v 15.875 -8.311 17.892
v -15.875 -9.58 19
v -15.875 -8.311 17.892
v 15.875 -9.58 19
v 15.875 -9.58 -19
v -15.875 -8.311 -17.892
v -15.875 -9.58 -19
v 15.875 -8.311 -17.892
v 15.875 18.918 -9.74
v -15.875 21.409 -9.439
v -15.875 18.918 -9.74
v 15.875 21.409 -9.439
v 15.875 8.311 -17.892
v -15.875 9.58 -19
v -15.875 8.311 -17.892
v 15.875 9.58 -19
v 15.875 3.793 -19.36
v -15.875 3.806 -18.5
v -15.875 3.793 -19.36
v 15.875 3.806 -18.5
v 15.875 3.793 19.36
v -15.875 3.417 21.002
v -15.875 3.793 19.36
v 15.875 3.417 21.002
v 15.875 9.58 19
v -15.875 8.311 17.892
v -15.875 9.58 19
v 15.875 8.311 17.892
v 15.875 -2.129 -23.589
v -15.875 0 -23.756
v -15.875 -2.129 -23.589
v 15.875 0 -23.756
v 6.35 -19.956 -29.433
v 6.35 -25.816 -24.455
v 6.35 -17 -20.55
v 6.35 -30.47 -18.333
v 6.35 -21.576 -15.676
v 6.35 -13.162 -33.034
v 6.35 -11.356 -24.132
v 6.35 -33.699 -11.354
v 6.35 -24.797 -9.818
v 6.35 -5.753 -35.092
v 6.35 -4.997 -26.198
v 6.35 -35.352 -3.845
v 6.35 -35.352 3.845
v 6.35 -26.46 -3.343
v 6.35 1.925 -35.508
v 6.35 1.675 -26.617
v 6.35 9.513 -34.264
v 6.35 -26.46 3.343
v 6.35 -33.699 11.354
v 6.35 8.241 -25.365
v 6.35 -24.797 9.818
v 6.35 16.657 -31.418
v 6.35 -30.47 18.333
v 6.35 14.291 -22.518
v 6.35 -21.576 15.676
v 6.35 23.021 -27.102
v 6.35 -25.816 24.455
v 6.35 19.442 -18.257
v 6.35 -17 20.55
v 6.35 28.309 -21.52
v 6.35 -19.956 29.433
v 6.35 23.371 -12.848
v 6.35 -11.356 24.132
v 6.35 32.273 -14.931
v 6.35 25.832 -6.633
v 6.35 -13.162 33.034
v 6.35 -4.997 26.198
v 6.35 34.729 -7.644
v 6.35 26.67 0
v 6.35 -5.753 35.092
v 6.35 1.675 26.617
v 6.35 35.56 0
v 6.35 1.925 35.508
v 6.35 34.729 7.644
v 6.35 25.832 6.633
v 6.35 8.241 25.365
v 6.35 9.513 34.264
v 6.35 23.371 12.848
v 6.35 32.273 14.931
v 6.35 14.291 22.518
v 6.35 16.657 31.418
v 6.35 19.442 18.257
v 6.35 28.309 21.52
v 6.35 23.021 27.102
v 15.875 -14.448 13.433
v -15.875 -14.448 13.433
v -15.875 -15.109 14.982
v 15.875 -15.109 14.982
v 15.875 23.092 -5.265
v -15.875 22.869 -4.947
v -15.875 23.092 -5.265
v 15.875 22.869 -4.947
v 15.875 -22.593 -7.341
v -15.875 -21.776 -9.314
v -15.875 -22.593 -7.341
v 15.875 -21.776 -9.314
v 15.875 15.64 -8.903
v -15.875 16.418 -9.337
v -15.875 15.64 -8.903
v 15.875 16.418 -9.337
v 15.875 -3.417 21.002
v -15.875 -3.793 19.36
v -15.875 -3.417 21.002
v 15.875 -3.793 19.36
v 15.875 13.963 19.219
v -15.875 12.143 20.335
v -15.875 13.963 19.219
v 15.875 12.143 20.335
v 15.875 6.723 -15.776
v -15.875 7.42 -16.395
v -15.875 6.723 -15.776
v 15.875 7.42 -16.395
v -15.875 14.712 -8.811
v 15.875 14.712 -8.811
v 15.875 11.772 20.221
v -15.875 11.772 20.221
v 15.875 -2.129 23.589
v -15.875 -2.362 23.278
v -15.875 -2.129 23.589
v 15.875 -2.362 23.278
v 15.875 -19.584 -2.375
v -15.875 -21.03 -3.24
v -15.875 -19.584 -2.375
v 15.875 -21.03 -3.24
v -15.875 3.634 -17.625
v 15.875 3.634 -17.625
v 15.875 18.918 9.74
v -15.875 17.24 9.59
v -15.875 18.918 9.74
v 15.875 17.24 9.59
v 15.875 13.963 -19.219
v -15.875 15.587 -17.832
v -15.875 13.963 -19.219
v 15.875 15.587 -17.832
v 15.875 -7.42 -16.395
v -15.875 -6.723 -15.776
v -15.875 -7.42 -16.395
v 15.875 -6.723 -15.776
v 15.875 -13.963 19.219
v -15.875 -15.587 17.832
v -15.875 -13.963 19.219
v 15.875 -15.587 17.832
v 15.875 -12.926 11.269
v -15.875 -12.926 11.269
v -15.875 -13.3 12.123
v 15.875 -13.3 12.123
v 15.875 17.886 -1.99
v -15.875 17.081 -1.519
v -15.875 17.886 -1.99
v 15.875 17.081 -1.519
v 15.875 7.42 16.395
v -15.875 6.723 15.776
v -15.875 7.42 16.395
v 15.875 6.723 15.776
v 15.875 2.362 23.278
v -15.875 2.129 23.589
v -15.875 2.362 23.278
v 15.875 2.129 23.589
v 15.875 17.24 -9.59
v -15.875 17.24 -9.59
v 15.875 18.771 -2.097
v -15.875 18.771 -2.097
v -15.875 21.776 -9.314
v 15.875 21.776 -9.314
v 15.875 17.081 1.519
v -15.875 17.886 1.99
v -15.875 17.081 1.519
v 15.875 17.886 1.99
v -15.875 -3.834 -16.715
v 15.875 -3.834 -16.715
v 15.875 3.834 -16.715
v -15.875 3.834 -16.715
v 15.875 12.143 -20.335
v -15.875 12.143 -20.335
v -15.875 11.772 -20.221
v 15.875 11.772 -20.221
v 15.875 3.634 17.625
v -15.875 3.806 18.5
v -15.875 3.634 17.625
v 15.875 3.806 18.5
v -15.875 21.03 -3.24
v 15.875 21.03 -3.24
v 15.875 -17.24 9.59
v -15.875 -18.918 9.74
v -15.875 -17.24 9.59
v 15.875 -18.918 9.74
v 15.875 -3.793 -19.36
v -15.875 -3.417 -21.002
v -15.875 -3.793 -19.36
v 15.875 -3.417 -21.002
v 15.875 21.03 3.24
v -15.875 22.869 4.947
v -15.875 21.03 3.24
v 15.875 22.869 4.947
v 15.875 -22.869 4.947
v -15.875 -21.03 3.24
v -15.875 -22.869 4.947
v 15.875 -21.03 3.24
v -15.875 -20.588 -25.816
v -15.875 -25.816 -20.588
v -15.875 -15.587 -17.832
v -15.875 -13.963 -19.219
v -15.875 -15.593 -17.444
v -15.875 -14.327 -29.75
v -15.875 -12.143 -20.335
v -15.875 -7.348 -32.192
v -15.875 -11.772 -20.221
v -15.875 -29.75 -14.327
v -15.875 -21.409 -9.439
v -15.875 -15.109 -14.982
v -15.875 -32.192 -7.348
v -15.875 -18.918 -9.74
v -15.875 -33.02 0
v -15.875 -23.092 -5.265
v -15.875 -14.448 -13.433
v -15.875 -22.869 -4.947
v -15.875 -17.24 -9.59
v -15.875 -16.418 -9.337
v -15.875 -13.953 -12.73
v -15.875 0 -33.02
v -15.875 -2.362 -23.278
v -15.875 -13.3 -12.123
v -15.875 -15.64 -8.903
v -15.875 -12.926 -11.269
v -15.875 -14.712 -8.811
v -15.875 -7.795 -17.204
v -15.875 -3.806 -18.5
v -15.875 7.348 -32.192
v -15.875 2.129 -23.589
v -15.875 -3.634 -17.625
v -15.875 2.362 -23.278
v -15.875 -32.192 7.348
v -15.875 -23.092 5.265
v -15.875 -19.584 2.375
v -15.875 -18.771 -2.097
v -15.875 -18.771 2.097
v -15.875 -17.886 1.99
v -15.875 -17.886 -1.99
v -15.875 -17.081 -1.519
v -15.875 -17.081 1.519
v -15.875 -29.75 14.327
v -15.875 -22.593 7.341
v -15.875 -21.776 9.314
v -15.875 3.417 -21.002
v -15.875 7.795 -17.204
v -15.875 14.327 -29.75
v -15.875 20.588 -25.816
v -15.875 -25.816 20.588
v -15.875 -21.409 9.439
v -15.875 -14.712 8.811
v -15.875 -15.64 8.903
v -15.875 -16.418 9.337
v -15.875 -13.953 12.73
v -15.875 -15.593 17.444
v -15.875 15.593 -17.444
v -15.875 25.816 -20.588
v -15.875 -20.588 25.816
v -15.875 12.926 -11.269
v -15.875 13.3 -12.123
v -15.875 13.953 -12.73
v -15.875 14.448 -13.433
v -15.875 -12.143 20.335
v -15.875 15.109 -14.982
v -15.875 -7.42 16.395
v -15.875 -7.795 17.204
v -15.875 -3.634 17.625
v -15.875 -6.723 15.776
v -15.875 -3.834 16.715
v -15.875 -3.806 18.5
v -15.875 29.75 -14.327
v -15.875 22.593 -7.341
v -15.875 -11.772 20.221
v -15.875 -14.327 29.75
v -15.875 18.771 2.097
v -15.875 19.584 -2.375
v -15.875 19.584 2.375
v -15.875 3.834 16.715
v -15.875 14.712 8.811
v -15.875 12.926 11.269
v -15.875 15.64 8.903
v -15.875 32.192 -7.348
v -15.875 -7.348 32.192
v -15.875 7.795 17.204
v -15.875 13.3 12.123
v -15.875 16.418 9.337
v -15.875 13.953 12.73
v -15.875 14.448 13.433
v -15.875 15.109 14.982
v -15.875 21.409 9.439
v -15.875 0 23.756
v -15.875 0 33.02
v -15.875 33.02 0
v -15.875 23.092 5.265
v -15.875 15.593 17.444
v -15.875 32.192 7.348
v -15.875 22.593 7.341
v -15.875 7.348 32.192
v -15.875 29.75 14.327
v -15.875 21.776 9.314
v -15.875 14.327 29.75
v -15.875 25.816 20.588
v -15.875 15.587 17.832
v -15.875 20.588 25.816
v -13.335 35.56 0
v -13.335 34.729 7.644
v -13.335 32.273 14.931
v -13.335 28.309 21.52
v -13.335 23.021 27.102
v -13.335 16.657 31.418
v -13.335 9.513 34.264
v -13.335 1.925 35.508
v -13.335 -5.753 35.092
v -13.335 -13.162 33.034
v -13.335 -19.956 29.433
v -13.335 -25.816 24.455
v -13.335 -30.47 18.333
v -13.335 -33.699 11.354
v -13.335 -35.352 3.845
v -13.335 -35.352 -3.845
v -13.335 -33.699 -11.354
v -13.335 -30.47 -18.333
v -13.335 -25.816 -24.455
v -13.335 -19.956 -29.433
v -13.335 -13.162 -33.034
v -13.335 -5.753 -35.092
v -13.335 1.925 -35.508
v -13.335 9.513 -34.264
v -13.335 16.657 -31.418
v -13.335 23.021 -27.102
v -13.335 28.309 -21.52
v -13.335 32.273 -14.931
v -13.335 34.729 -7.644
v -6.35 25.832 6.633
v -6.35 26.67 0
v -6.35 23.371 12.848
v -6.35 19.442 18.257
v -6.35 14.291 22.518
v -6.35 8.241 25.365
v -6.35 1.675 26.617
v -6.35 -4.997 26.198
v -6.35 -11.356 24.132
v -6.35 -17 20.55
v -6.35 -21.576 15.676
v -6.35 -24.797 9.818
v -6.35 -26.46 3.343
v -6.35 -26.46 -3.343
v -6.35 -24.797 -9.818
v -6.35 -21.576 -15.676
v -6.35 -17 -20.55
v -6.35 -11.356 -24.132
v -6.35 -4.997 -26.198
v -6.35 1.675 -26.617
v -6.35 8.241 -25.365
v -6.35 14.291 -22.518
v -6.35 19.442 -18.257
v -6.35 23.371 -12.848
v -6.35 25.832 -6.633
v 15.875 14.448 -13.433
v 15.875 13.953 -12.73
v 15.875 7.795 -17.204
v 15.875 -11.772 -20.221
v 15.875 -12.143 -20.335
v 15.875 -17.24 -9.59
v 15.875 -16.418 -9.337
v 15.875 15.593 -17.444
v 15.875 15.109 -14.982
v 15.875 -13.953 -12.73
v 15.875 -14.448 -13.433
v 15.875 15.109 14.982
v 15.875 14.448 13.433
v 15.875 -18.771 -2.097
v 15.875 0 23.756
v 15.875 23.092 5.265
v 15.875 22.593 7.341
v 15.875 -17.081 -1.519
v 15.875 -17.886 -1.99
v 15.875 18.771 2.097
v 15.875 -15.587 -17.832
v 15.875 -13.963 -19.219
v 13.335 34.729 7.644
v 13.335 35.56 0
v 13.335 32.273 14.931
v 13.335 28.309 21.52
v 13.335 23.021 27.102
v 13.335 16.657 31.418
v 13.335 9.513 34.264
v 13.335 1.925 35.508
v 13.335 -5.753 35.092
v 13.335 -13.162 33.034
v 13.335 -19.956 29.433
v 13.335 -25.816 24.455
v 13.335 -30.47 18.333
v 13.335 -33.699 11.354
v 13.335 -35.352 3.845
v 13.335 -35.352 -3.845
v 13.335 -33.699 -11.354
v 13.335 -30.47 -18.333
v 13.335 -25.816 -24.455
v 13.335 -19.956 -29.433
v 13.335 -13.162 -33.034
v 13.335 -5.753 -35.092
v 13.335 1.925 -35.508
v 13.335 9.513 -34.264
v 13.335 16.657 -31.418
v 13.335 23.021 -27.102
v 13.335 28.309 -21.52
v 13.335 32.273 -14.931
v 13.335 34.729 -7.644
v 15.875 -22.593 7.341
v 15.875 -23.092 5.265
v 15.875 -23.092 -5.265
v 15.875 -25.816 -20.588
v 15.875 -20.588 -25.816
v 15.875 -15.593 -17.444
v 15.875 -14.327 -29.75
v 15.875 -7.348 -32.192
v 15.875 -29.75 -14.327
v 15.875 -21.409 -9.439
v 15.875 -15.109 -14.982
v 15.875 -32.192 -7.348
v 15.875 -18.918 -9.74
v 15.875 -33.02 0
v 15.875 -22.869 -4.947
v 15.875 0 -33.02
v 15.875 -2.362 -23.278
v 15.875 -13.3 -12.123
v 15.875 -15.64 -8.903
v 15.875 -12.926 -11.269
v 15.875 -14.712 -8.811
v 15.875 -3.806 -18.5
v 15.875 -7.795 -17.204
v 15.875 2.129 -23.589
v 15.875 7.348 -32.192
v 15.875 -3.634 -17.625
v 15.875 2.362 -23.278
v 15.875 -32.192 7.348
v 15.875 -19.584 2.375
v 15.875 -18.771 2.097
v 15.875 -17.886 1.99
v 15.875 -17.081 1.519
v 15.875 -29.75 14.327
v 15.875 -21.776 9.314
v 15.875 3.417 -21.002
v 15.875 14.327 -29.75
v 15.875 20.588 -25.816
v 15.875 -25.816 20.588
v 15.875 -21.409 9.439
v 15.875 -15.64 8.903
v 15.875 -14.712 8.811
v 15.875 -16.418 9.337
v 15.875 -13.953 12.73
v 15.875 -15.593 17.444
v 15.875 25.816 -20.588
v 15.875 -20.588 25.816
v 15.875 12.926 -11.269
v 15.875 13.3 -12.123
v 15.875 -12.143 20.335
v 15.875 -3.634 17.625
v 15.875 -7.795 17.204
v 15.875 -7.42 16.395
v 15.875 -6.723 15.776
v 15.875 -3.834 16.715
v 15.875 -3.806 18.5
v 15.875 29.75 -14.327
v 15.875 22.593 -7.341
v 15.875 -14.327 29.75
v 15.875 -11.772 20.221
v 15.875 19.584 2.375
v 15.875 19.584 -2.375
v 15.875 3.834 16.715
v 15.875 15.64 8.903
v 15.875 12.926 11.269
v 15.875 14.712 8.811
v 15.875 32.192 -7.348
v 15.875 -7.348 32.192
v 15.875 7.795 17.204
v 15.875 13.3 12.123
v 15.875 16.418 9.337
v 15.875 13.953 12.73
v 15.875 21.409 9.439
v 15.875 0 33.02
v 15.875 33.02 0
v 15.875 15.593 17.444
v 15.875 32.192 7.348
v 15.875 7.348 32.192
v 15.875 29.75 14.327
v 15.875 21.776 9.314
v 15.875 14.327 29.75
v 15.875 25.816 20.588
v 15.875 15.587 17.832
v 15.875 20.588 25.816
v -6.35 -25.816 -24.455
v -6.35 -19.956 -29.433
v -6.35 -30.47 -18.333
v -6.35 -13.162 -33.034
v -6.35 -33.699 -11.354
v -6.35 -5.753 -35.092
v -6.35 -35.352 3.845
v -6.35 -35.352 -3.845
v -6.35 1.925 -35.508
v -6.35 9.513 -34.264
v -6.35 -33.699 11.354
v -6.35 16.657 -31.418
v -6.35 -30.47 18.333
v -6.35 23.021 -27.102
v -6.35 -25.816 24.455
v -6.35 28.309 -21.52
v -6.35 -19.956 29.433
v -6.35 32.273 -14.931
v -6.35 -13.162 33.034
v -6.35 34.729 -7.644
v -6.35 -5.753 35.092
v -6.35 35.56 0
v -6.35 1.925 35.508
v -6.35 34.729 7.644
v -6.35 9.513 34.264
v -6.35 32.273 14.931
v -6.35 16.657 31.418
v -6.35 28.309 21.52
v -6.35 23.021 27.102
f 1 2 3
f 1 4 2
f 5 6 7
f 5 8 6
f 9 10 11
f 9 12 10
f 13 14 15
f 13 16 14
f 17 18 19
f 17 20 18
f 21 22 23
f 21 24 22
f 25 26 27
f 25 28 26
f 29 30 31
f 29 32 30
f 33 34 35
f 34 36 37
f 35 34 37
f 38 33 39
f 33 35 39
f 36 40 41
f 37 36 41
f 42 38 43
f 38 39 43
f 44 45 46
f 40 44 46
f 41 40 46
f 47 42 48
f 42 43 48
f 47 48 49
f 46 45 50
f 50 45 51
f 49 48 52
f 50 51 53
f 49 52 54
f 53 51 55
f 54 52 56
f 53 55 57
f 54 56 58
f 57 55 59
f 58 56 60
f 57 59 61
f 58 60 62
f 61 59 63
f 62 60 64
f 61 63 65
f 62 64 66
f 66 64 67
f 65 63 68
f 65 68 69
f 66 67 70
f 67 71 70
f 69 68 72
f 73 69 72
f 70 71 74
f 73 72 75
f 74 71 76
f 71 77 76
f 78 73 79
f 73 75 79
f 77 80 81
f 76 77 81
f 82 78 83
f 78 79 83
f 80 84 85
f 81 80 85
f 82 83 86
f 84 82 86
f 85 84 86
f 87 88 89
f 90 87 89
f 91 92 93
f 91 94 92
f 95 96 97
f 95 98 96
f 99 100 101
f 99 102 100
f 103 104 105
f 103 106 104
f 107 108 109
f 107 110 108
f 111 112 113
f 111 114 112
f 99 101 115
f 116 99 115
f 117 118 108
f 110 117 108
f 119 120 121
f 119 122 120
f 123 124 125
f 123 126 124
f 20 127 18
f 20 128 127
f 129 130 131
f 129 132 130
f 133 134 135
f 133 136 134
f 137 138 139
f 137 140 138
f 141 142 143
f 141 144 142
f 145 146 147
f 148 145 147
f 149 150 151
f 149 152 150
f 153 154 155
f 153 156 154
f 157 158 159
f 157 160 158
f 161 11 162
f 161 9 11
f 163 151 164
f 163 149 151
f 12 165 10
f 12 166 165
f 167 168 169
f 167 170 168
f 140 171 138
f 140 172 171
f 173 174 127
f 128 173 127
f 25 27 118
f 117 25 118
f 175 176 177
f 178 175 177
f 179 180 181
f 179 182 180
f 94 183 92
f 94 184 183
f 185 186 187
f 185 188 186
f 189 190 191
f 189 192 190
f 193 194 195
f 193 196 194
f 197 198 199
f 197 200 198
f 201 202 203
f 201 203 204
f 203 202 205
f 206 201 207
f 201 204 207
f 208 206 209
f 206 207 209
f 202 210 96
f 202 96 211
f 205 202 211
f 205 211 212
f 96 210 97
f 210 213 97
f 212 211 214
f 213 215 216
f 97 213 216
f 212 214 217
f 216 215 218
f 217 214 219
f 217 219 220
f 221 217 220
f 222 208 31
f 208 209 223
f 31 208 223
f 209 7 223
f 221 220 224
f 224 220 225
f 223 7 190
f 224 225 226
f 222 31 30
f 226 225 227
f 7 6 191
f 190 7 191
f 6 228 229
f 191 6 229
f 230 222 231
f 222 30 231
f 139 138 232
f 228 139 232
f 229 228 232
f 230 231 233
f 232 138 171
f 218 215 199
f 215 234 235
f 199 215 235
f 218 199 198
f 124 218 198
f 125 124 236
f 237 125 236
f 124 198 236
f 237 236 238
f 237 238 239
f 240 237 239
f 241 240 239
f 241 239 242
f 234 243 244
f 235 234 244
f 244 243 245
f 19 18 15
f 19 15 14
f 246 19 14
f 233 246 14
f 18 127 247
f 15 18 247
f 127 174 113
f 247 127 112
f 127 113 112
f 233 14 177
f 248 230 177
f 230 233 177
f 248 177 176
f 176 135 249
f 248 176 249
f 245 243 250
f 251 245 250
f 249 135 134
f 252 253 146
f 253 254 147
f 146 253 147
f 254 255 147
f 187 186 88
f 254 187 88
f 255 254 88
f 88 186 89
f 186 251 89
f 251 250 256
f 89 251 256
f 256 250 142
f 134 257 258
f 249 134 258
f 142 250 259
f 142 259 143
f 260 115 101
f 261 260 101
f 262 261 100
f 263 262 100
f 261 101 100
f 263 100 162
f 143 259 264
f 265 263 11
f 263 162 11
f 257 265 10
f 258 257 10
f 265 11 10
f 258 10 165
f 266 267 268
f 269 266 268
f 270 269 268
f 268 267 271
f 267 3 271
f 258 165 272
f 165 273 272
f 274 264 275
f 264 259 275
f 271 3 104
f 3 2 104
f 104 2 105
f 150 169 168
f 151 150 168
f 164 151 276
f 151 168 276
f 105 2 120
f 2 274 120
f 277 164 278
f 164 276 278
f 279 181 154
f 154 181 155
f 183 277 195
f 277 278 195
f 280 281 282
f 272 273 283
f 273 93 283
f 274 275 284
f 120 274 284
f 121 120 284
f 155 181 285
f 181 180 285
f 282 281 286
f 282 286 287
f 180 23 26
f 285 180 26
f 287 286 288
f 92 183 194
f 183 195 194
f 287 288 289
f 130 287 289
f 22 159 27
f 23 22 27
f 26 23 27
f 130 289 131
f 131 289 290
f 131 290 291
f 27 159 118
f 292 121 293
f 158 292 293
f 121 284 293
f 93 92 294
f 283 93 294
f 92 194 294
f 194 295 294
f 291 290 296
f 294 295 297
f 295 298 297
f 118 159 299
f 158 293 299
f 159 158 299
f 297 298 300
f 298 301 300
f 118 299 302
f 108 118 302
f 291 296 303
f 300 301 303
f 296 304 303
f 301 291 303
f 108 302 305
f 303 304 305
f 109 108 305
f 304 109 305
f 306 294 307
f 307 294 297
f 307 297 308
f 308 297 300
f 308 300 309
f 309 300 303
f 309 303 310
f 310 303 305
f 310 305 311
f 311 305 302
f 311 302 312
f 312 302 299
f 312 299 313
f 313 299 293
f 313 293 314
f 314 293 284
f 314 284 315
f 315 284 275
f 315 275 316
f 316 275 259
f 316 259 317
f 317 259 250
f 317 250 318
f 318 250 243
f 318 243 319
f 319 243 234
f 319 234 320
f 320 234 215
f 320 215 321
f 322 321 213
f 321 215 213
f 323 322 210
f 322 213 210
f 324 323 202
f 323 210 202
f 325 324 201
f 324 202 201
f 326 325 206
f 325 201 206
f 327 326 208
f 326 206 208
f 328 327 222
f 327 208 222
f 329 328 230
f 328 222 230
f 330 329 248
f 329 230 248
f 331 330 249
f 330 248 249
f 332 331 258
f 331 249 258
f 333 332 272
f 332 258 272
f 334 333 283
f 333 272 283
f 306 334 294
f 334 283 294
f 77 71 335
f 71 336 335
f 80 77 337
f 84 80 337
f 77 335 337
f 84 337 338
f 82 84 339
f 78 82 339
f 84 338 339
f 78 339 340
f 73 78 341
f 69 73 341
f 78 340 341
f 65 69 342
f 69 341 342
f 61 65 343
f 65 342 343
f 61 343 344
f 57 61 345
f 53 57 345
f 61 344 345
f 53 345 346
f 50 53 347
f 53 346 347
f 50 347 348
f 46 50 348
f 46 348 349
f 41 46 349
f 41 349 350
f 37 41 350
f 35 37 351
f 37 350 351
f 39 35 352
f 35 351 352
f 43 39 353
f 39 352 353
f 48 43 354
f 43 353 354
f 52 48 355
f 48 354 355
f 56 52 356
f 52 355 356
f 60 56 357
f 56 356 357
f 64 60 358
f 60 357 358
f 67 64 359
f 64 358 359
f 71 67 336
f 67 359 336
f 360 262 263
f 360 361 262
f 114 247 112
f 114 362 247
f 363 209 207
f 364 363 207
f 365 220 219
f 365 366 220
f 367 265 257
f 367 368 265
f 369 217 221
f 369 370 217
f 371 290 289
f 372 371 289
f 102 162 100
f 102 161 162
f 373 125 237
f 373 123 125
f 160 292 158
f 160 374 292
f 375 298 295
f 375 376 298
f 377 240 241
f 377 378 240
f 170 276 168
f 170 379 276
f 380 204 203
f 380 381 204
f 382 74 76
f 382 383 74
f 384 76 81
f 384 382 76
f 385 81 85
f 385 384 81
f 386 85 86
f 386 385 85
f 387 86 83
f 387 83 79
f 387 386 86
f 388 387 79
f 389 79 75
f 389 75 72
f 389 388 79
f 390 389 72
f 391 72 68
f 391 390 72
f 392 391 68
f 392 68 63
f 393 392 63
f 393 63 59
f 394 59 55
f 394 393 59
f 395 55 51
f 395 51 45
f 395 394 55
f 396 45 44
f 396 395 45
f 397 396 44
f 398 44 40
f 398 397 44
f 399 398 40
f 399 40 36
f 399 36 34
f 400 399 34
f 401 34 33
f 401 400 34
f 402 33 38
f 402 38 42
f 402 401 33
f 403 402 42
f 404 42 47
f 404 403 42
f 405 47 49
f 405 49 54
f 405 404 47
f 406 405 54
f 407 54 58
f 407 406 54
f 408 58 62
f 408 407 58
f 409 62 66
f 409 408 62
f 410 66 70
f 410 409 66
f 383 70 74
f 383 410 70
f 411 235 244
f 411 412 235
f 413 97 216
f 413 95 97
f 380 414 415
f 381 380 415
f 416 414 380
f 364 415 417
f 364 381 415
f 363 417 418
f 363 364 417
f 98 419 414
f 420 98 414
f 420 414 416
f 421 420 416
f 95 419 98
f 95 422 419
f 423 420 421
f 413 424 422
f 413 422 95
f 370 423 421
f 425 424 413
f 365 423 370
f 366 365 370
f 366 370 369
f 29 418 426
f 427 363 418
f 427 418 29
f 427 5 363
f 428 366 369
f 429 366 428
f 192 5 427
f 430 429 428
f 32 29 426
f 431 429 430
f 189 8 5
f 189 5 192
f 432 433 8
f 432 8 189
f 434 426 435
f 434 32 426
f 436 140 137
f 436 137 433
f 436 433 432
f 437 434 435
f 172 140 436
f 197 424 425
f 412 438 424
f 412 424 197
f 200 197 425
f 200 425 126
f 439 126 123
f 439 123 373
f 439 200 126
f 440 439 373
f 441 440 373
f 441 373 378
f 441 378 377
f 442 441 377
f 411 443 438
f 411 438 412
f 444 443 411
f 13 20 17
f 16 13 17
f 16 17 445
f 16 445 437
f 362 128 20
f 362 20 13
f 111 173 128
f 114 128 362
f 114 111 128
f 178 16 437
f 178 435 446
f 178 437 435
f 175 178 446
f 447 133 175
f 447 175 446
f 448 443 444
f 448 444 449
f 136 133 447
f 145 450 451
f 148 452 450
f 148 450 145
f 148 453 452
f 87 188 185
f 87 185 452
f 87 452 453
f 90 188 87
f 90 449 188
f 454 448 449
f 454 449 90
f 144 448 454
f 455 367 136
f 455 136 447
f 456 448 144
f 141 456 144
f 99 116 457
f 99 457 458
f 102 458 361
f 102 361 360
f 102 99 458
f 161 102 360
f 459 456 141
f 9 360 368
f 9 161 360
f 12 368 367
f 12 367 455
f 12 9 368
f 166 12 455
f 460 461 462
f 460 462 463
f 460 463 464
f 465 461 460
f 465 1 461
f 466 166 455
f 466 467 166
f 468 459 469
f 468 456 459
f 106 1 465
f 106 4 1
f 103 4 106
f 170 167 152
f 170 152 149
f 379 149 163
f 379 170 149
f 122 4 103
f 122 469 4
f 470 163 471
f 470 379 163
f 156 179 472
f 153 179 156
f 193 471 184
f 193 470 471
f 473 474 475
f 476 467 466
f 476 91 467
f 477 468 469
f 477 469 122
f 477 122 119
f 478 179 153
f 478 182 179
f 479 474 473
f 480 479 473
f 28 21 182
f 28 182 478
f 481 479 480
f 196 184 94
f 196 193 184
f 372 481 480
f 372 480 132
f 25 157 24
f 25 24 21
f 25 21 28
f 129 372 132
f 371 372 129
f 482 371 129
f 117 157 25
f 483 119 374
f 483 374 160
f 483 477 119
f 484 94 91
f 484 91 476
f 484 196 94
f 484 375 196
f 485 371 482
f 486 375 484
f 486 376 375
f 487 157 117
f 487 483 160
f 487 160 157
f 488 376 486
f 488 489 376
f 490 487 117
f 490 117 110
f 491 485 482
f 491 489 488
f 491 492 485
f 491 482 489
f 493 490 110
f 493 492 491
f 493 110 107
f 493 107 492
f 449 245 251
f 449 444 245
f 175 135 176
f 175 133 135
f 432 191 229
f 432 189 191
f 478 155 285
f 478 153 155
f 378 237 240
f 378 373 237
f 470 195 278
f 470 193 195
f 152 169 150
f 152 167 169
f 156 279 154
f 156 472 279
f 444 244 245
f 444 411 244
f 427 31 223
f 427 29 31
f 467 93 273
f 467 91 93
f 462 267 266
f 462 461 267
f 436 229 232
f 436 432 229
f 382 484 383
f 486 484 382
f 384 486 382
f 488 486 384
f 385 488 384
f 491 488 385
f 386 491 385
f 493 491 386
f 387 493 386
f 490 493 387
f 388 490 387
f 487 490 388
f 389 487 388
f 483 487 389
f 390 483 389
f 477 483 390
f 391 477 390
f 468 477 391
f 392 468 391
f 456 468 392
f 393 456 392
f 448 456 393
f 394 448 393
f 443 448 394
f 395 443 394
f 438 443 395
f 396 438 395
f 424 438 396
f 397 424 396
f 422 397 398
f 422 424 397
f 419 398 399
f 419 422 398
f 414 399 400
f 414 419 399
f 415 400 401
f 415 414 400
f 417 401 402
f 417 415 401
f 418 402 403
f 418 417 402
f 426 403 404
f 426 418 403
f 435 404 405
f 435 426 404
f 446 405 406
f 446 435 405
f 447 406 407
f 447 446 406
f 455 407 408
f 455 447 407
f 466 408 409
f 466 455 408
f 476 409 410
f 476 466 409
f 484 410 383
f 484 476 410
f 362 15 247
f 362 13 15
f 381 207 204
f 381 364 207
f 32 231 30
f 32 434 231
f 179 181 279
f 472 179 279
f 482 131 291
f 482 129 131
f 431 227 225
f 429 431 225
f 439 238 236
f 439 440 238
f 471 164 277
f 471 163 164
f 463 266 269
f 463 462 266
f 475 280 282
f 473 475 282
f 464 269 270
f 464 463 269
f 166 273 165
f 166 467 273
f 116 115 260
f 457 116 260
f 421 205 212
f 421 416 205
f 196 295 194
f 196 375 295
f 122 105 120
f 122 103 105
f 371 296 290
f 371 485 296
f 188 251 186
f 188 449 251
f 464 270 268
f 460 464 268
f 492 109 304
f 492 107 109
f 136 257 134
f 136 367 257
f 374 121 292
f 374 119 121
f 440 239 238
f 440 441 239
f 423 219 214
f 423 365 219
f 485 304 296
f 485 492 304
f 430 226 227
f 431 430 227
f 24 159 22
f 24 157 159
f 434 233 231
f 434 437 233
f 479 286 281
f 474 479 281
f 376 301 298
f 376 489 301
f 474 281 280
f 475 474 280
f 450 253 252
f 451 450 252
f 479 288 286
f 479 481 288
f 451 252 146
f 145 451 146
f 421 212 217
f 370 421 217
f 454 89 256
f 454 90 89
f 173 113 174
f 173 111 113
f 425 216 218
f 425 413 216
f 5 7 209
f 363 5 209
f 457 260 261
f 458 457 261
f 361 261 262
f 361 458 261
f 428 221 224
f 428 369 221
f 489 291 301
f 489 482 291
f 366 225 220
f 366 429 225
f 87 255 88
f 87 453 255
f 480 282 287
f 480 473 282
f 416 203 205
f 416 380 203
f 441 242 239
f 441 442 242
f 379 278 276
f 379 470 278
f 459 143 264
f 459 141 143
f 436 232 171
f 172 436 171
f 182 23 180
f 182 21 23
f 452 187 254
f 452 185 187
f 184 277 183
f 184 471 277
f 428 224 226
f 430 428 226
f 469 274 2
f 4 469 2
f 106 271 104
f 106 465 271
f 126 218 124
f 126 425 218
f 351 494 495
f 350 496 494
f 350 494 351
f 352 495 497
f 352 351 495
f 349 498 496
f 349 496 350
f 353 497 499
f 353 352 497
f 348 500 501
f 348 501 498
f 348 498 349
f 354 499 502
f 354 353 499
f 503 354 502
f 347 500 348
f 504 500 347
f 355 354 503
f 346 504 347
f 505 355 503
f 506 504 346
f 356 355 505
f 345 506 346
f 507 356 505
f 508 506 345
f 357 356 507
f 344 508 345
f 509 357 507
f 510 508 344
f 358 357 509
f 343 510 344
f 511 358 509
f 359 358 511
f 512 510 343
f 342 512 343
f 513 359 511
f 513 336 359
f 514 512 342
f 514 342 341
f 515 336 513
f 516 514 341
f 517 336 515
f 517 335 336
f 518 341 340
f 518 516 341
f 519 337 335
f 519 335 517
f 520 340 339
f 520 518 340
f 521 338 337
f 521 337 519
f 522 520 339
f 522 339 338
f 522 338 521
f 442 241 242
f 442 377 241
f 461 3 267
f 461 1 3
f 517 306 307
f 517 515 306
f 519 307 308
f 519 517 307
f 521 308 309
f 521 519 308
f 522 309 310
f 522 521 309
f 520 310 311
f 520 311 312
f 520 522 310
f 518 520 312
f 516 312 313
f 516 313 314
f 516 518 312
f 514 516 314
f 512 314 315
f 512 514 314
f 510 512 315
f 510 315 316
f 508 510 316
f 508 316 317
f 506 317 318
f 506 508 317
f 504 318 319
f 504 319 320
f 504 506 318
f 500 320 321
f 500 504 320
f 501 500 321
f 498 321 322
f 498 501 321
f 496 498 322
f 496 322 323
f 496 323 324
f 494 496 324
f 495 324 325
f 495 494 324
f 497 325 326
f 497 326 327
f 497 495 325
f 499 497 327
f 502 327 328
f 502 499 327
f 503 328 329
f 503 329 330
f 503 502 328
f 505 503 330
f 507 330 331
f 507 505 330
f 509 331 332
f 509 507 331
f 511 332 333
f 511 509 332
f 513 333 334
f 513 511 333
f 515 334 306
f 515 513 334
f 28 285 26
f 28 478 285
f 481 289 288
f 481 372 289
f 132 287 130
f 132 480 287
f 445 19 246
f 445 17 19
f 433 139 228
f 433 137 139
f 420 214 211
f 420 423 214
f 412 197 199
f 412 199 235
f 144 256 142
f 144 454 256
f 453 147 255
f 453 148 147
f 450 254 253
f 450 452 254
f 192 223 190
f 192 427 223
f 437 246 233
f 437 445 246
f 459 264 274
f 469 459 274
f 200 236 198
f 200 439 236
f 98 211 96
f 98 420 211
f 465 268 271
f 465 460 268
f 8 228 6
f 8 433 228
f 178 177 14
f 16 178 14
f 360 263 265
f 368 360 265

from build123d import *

# Parameters (mm, degrees)
F0_R     = 35.56
F1_DEPTH = 15.875
F2_SIZE  = 2.54
F3_R     = 35.56
F3_R_2   = 26.67
F4_DEPTH = 6.35


with BuildPart() as f1:
    # F0 (on Right) → F1 (new body, symmetric)
    with BuildSketch(Plane.YZ):
        Circle(F0_R)
        Polygon((-22.868566, 4.947201), (-23.091865, 5.26471), (-22.593373, 7.34102), (-21.776228, 9.313816), (-21.408965, 9.439421), (-18.91785, 9.740089), (-17.24005, 9.589805), (-16.418303, 9.336703), (-15.639718, 8.903017), (-14.711918, 8.811145), (-12.92615, 11.269048), (-13.300231, 12.123061), (-13.95326, 12.72952), (-14.44792, 13.432851), (-15.109308, 14.982086), (-15.593147, 17.444193), (-15.587177, 17.832304), (-13.963484, 19.219065), (-12.142814, 20.334787), (-11.771843, 20.220526), (-9.579779, 18.999523), (-8.310763, 17.891761), (-7.794708, 17.203978), (-7.419732, 16.39549), (-6.723118, 15.775821), (-3.833668, 16.714666), (-3.634351, 17.625449), (-3.806203, 18.499936), (-3.792969, 19.359671), (-3.417421, 21.001798), (-2.361702, 23.278071), (-2.128751, 23.58854), (0, 23.756089), (2.128751, 23.58854), (2.361702, 23.278071), (3.417421, 21.001798), (3.792969, 19.359671), (3.806203, 18.499936), (3.634351, 17.625449), (3.833668, 16.714666), (6.723118, 15.775821), (7.419732, 16.39549), (7.794708, 17.203978), (8.310763, 17.891761), (9.579779, 18.999523), (11.771843, 20.220526), (12.142814, 20.334787), (13.963484, 19.219065), (15.587177, 17.832304), (15.593147, 17.444193), (15.109308, 14.982086), (14.44792, 13.432851), (13.95326, 12.72952), (13.300231, 12.123061), (12.92615, 11.269048), (14.711918, 8.811145), (15.639718, 8.903017), (16.418303, 9.336703), (17.24005, 9.589805), (18.91785, 9.740089), (21.408965, 9.439421), (21.776228, 9.313816), (22.593373, 7.34102), (23.091865, 5.26471), (22.868566, 4.947201), (21.029934, 3.239747), (19.584239, 2.375136), (18.770651, 2.096884), (17.885865, 1.990085), (17.081258, 1.519058), (17.081258, -1.519058), (17.885865, -1.990085), (18.770651, -2.096884), (19.584239, -2.375136), (21.029934, -3.239747), (22.868566, -4.947201), (23.091865, -5.26471), (22.593373, -7.34102), (21.776228, -9.313816), (21.408965, -9.439421), (18.91785, -9.740089), (17.24005, -9.589805), (16.418303, -9.336703), (15.639718, -8.903017), (14.711918, -8.811145), (12.92615, -11.269048), (13.300231, -12.123061), (13.95326, -12.72952), (14.44792, -13.432851), (15.109308, -14.982086), (15.593147, -17.444193), (15.587177, -17.832304), (13.963484, -19.219065), (12.142814, -20.334787), (11.771843, -20.220526), (9.579779, -18.999523), (8.310763, -17.891761), (7.794708, -17.203978), (7.419732, -16.39549), (6.723118, -15.775821), (3.833668, -16.714666), (3.634351, -17.625449), (3.806203, -18.499936), (3.792969, -19.359671), (3.417421, -21.001798), (2.361702, -23.278071), (2.128751, -23.58854), (0, -23.756089), (-2.128751, -23.58854), (-2.361702, -23.278071), (-3.417421, -21.001798), (-3.792969, -19.359671), (-3.806203, -18.499936), (-3.634351, -17.625449), (-3.833668, -16.714666), (-6.723118, -15.775821), (-7.419732, -16.39549), (-7.794708, -17.203978), (-8.310763, -17.891761), (-9.579779, -18.999523), (-11.771843, -20.220526), (-12.142814, -20.334787), (-13.963484, -19.219065), (-15.587177, -17.832304), (-15.593147, -17.444193), (-15.109308, -14.982086), (-14.44792, -13.432851), (-13.95326, -12.72952), (-13.300231, -12.123061), (-12.92615, -11.269048), (-14.711918, -8.811145), (-15.639718, -8.903017), (-16.418303, -9.336703), (-17.24005, -9.589805), (-18.91785, -9.740089), (-21.408965, -9.439421), (-21.776228, -9.313816), (-22.593373, -7.34102), (-23.091865, -5.26471), (-22.868566, -4.947201), (-21.029934, -3.239747), (-19.584239, -2.375136), (-18.770651, -2.096884), (-17.885865, -1.990085), (-17.081258, -1.519058), (-17.081258, 1.519058), (-17.885865, 1.990085), (-18.770651, 2.096884), (-19.584239, 2.375136), (-21.029934, 3.239747), align=None, mode=Mode.SUBTRACT)
    extrude(amount=F1_DEPTH, both=True)

    # F2
    f2_edges = [f1.edges().sort_by_distance(p)[0] for p in [
        (15.875, -35.56, 0),
        (-15.875, -35.56, 0),
    ]]
    chamfer(f2_edges, length=F2_SIZE)

    # F3 (on Right) → F4 (cut, symmetric)
    with BuildSketch(Plane.YZ):
        Circle(F3_R)
        Circle(F3_R_2, mode=Mode.SUBTRACT)
    extrude(amount=F4_DEPTH, both=True, mode=Mode.SUBTRACT)


solid = f1.part
